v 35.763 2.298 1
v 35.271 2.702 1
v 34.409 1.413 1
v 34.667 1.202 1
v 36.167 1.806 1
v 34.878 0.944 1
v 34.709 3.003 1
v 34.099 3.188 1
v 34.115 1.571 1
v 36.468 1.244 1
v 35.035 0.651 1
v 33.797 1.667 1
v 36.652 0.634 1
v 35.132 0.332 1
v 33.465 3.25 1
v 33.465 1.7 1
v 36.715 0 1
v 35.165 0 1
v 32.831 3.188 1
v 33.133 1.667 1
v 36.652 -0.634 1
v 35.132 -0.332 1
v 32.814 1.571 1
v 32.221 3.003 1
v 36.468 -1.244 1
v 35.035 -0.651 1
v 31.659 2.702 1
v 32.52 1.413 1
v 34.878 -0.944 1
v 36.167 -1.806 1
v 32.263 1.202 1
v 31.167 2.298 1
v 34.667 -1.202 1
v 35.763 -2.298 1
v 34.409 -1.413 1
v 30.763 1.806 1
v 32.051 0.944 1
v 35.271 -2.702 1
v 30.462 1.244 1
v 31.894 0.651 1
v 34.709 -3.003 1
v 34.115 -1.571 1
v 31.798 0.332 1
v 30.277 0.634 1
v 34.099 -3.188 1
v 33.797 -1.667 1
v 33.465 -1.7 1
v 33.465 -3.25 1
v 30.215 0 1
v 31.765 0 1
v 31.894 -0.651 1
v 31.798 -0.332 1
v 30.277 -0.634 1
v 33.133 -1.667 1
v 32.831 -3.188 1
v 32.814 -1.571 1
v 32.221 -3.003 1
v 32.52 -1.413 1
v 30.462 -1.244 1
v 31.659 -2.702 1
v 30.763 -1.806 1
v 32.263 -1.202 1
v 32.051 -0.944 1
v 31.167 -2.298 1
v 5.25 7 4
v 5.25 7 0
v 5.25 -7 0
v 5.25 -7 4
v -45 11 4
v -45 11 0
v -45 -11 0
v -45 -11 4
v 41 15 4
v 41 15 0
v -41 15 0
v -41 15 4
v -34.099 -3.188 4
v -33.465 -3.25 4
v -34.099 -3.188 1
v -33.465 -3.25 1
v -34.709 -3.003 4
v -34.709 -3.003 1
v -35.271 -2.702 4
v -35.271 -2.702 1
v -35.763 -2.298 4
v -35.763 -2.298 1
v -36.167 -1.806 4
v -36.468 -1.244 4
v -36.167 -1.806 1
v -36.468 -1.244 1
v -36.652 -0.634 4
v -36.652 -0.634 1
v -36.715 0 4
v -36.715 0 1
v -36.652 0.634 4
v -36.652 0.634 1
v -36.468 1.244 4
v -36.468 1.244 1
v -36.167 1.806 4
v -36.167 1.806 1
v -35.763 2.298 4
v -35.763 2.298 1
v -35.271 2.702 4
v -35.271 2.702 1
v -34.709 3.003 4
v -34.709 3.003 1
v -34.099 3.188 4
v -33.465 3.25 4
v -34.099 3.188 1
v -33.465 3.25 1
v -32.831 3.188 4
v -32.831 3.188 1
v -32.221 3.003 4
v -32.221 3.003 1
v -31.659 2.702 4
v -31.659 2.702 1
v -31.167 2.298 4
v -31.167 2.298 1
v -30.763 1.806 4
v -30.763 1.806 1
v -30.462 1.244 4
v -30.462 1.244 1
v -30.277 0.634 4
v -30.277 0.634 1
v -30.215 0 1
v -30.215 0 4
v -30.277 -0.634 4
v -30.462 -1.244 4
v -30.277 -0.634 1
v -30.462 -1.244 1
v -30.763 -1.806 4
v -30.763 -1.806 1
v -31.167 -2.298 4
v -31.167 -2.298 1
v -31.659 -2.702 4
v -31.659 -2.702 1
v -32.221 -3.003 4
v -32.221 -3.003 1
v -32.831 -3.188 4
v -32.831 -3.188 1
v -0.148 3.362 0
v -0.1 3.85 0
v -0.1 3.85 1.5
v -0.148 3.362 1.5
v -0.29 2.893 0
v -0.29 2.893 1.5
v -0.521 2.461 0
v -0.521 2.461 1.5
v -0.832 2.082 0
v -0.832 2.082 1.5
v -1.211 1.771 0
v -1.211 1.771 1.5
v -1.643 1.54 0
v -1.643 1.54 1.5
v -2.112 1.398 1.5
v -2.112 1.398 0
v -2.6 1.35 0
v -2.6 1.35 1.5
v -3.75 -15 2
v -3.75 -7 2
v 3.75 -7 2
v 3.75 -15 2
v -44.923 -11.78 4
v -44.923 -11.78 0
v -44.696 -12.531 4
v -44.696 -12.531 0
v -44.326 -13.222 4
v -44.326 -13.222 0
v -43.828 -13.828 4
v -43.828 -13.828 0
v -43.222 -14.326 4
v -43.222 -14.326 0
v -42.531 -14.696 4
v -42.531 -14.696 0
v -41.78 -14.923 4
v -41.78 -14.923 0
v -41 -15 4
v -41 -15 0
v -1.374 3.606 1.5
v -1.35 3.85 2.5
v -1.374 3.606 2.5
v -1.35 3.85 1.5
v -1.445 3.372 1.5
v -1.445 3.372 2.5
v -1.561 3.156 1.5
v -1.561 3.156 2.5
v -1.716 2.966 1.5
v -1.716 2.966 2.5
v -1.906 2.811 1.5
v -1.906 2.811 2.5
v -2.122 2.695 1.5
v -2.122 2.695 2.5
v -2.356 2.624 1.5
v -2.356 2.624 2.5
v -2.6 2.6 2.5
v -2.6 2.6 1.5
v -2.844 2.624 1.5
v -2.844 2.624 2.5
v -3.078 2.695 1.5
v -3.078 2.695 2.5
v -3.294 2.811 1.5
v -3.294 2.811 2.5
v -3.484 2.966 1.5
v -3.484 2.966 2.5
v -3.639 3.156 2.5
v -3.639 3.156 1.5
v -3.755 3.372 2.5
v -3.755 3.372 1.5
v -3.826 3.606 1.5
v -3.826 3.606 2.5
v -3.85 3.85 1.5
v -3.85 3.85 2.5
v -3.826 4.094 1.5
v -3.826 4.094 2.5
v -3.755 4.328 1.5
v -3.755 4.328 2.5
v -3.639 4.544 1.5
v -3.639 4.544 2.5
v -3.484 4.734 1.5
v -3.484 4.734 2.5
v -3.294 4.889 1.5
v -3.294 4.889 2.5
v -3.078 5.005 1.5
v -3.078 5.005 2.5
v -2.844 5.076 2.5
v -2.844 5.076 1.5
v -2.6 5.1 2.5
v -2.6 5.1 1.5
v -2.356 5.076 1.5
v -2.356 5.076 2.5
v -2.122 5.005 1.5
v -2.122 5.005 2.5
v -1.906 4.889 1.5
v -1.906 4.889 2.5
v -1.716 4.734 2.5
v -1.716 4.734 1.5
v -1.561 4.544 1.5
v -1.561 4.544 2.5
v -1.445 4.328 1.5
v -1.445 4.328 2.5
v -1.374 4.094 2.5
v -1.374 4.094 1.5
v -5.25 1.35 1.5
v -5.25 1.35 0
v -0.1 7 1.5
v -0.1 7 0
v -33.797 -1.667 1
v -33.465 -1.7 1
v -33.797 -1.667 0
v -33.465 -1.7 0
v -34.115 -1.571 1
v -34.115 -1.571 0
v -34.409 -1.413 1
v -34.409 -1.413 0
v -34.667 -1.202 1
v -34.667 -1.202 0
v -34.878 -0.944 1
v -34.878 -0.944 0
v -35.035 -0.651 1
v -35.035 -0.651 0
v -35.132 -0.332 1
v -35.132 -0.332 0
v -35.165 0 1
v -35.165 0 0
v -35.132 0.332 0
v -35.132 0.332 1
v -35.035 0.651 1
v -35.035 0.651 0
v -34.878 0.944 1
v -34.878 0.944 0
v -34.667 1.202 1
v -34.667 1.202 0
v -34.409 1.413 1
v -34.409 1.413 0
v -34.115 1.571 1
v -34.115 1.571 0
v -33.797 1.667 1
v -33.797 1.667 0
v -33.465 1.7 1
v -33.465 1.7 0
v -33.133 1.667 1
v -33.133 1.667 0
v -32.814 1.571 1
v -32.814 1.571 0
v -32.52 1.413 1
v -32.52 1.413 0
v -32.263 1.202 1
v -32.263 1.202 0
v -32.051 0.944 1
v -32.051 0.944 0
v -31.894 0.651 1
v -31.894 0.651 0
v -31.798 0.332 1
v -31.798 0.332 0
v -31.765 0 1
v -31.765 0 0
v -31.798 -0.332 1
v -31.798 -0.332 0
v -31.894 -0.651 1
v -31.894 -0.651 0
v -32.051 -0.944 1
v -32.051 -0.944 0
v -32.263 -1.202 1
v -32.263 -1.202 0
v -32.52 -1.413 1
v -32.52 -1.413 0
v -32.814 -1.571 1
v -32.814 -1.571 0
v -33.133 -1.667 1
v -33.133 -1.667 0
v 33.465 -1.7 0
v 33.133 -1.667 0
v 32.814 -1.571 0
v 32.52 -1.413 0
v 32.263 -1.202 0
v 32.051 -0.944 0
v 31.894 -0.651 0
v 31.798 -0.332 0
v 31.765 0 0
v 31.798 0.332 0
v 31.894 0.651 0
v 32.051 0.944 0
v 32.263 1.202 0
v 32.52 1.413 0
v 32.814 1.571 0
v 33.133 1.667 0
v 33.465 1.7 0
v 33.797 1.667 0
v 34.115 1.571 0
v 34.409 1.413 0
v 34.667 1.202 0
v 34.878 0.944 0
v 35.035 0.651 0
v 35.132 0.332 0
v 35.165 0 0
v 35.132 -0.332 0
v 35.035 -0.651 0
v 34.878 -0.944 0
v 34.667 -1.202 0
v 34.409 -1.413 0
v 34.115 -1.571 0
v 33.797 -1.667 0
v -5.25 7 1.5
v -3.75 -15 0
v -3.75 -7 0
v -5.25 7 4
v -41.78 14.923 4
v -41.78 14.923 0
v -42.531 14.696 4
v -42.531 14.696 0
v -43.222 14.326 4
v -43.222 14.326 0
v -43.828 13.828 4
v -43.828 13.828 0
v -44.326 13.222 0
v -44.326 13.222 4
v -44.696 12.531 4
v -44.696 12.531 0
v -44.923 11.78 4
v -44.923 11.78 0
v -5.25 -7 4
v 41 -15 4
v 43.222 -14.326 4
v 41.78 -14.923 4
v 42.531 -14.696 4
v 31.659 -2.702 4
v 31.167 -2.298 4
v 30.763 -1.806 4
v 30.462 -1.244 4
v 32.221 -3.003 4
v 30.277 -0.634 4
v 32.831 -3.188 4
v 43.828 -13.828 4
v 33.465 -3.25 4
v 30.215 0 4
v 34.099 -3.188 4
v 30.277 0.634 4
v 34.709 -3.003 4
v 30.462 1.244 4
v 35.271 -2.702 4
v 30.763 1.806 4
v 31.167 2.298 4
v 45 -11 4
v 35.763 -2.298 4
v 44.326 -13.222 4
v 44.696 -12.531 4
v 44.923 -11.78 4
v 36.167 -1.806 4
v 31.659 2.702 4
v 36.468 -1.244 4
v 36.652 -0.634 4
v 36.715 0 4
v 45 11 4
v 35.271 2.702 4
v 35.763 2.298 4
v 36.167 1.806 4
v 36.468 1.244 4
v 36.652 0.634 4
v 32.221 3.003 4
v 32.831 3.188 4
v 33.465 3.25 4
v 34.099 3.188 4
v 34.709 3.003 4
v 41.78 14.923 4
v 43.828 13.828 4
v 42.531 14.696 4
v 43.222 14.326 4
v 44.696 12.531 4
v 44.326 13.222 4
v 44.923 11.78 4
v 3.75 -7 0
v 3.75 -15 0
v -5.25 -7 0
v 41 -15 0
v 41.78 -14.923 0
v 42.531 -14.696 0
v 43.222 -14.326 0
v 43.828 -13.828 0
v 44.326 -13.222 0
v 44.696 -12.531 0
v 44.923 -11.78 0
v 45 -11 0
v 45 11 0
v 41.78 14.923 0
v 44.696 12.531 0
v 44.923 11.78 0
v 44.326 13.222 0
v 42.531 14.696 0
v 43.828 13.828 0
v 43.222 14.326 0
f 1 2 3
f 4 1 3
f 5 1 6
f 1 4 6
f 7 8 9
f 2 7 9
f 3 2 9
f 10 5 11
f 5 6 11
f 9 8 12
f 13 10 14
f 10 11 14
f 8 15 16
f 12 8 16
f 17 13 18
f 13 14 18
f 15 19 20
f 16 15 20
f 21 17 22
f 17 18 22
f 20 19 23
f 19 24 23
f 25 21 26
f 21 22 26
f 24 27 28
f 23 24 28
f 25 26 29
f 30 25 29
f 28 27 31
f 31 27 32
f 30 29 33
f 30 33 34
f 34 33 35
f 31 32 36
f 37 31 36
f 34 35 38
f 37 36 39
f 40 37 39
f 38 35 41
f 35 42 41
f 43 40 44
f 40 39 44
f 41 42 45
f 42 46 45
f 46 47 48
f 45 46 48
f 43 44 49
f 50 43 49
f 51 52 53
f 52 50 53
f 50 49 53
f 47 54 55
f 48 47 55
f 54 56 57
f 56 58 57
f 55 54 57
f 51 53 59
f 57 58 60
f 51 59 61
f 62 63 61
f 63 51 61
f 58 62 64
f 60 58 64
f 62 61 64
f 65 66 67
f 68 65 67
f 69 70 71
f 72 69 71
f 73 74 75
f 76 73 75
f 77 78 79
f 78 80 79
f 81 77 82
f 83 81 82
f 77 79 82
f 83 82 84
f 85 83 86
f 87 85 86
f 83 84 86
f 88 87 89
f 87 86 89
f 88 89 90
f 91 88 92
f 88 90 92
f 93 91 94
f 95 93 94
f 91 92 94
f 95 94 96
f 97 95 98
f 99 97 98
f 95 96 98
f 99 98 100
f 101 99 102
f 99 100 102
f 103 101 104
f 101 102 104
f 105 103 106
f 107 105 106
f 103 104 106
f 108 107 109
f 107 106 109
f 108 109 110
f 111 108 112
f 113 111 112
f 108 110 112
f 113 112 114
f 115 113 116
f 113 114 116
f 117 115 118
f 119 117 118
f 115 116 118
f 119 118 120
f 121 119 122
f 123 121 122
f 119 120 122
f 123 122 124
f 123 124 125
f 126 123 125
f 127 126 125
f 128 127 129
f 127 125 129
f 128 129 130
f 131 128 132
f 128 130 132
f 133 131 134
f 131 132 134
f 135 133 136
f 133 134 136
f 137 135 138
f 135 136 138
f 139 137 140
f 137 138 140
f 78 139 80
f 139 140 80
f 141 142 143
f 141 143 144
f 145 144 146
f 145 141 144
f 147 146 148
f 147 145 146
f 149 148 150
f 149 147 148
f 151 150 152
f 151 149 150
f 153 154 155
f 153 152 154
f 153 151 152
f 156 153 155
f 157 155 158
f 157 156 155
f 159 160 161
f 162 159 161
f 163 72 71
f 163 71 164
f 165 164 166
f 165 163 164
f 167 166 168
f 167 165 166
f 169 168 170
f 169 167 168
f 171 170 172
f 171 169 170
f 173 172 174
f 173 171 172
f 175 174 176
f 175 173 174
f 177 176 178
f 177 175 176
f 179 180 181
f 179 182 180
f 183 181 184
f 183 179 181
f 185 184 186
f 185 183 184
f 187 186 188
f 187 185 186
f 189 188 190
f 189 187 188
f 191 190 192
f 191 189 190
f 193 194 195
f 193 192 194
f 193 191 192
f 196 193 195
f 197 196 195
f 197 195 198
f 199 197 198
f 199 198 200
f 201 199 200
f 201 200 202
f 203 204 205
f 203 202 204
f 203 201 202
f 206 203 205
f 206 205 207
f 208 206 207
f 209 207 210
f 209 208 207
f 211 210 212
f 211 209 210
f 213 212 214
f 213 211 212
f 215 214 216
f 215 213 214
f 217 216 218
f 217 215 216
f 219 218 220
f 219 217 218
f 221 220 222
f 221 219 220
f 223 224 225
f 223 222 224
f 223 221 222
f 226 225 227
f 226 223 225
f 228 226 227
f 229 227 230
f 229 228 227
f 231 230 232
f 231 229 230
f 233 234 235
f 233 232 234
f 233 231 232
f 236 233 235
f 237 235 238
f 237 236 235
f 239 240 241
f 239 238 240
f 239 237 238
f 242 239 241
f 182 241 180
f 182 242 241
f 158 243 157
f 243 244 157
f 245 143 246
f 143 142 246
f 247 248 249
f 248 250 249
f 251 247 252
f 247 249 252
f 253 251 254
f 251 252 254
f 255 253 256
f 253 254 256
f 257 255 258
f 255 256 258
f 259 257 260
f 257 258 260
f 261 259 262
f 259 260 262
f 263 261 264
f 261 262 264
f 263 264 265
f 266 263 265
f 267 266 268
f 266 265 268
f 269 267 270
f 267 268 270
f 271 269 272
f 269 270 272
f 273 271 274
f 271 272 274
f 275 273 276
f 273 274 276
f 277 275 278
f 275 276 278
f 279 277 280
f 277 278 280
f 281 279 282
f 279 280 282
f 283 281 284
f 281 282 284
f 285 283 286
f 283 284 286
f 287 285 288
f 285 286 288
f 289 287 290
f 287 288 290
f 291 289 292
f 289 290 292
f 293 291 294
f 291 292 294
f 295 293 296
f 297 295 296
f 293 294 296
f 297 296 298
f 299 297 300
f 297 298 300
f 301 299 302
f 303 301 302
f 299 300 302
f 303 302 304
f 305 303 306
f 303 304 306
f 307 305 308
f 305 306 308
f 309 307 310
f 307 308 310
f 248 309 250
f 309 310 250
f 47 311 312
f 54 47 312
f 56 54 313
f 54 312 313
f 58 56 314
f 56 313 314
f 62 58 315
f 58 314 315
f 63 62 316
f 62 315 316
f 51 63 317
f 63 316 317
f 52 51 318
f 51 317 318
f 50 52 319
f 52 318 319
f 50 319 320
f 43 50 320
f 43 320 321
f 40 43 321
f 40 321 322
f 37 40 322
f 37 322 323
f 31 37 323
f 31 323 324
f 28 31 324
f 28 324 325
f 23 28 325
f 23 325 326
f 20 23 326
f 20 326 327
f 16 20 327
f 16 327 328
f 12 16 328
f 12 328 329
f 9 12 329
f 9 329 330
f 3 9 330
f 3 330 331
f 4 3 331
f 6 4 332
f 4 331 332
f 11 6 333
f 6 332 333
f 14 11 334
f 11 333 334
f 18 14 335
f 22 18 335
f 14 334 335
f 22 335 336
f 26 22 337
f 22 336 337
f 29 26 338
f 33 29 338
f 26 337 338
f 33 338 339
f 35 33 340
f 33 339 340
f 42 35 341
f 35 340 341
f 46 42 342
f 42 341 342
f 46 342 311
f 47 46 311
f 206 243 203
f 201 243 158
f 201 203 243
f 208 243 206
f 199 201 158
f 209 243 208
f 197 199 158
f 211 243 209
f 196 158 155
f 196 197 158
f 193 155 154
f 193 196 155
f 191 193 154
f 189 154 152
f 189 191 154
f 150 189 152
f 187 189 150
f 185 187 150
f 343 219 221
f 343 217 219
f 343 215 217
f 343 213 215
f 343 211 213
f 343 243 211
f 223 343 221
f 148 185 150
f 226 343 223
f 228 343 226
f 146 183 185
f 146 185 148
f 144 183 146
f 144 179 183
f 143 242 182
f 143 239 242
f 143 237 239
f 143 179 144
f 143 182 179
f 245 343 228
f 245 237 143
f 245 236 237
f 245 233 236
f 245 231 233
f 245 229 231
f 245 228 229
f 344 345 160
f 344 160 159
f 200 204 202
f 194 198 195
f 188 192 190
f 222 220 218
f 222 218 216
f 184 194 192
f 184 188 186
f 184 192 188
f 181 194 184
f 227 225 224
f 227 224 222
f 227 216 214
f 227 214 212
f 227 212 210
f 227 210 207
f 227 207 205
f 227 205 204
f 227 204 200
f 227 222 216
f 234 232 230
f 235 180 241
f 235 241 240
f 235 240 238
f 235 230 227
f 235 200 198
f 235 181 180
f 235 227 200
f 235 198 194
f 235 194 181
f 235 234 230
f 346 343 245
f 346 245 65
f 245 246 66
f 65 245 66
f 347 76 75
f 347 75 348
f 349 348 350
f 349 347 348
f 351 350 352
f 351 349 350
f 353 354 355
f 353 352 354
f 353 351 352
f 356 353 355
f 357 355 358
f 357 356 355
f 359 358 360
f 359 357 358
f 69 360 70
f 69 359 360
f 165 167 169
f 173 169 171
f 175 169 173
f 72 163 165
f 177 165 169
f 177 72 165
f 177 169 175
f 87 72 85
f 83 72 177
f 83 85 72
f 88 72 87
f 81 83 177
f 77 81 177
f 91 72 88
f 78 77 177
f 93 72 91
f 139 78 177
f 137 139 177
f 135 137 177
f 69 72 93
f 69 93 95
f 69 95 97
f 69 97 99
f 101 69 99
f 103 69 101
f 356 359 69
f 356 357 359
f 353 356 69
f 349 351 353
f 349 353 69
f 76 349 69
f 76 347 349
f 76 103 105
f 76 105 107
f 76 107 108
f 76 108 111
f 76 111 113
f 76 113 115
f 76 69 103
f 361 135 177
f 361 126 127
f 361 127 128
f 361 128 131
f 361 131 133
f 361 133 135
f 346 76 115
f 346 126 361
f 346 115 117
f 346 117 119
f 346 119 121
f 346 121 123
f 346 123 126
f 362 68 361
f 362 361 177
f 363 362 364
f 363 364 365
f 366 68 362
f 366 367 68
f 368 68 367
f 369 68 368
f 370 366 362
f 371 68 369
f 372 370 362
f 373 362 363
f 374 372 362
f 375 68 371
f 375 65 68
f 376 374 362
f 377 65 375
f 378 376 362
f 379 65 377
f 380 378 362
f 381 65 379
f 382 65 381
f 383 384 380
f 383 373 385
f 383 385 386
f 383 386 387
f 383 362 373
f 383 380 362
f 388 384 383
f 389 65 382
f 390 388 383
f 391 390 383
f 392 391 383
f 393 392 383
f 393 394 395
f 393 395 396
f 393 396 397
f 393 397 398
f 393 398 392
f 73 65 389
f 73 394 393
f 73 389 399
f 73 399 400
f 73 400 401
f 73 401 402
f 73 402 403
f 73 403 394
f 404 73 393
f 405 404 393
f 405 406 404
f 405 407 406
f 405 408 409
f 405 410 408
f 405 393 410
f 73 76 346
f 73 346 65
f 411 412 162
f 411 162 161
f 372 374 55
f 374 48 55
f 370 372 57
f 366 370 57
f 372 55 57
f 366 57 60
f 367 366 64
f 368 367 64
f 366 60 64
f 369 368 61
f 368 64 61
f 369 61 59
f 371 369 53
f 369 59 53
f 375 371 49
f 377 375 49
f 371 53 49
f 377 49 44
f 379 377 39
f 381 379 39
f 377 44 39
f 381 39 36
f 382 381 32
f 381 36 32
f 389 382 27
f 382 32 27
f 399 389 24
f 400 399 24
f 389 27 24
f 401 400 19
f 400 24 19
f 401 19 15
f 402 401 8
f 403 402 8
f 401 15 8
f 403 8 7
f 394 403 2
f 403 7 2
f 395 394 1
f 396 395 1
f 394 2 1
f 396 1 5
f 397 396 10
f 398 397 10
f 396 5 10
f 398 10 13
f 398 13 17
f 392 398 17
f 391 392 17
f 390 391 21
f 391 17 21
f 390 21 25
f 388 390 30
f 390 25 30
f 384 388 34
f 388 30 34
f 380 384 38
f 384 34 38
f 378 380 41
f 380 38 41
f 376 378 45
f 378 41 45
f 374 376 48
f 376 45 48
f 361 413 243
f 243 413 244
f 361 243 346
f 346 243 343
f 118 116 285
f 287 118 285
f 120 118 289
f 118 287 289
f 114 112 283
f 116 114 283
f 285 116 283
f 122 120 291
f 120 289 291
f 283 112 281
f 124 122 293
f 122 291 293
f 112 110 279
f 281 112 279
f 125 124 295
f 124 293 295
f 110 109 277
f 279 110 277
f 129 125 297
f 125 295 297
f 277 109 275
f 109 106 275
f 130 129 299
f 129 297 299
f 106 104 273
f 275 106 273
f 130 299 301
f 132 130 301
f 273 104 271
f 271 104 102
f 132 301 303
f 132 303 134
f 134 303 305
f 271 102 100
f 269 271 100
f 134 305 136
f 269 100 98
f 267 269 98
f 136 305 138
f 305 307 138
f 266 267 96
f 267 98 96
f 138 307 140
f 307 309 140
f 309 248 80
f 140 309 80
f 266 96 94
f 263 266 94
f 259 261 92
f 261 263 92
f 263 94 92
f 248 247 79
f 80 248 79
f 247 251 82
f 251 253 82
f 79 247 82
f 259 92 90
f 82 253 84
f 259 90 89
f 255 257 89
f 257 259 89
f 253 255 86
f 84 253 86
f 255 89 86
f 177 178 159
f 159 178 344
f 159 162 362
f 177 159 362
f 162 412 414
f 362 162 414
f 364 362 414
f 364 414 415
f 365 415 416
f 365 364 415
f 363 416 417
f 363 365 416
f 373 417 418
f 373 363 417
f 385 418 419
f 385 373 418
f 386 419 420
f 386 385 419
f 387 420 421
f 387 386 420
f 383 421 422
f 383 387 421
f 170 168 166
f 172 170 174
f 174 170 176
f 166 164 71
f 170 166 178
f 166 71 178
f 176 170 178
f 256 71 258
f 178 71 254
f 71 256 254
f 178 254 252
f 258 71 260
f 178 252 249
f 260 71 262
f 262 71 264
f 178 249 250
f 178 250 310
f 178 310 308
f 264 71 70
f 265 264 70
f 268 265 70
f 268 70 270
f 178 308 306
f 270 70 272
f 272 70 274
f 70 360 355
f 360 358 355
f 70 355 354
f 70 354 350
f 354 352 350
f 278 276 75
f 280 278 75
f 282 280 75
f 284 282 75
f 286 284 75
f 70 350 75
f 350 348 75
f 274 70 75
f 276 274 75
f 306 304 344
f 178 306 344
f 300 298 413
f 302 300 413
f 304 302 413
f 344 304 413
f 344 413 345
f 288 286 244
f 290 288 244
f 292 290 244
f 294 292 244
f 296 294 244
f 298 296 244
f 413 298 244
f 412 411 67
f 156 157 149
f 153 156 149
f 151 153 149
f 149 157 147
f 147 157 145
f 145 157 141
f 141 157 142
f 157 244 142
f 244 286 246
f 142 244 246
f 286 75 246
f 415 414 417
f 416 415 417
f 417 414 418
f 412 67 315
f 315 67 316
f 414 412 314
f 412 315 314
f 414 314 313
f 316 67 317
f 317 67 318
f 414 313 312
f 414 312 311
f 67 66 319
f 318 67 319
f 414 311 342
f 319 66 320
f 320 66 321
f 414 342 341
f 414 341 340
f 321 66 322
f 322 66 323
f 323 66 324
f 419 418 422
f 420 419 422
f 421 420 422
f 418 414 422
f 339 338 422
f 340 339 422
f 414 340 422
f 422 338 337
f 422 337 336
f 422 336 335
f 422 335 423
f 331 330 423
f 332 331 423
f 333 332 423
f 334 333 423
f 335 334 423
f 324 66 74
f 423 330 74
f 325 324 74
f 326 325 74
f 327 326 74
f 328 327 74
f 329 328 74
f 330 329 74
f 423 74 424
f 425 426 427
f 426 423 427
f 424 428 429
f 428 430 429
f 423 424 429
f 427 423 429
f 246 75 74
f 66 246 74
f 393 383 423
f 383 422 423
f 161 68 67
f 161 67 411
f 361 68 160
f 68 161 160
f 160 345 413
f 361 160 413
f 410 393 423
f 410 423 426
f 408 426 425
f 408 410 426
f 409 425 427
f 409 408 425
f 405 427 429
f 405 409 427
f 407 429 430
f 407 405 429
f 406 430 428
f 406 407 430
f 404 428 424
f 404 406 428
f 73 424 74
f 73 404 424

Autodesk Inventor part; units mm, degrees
ref_plane "YZ Plane" through (0, 0, 0) normal (1, 0, 0) x (0, 1, 0)
ref_plane "XZ Plane" through (0, 0, 0) normal (0, 1, 0) x (-1, 0, 0)
ref_plane "XY Plane" through (0, 0, 0) normal (0, 0, 1) x (1, 0, 0)
sketch "Skizze1" plane through (0, 0, 0) normal (0, 0, 1) x (1, 0, 0)
  line L0 (-45, -15) -> (45, -15)
  line L1 (45, -15) -> (45, 15)
  line L2 (45, 15) -> (-45, 15)
  line L3 (-45, 15) -> (-45, -15)
  line L4 (-45, -15) -> (45, 15) construction
  line L5 (45, -15) -> (-45, 15) construction
  circle A0 centre (-33.4649, 0) radius 1.5
  circle A1 centre (33.4649, 0) radius 1.5
  line L6 (0, -21) -> (0, 21) construction
  line L7 (-63, 0) -> (63, 0) construction
  line L8 (-5.25, 7) -> (5.25, 7)
  line L9 (5.25, 7) -> (5.25, -7)
  line L10 (5.25, -7) -> (-5.25, -7)
  line L11 (-5.25, -7) -> (-5.25, 7)
  circle A2 centre (-2.6, 3.85) radius 1.65 construction
  circle A3 centre (-2.6, 3.85) radius 1.25
  circle A4 centre (-2.6, 3.85) radius 2.5
  line L12 (-5.25, 1.35) -> (-2.6, 1.35)
  line L13 (-0.1, 3.85) -> (-0.1, 7)
  line L14 (-5.25, 1.35) -> (-5.25, 7)
  line L15 (-5.25, 7) -> (-0.1, 7)
  line L16 (-3.75, -15) -> (3.75, -15)
  line L17 (3.75, -15) -> (3.75, -7)
  line L18 (3.75, -7) -> (-3.75, -7)
  line L19 (-3.75, -7) -> (-3.75, -15)
  point P0 (0, 0)
  point P1 (0, -7)
  point P2 (-5.25, -15)
  point P3 (-5.25, -4.15)
  point P4 (5.25, 0)
  point P5 (0, -15)
  dimension "d0" = 66.9299
  dimension "d1" = 30
  dimension "d2" = 90
  dimension "d3" = 3
  dimension "d6" = 14
  dimension "d7" = 10.5
  dimension "d8" = 1
  dimension "d9" = 1.5
  dimension "d10" = 3.3
  dimension "d11" = 2.5
  dimension "d16" = 5
  dimension "d18" = 7.5
extrude "Extrusion2" add sketch "Skizze1" along normal blind 4 contours L3 L2 L1 L0 L17 L10 L9 L8 L11 L19 | L19 L10 L17 L0
extrude "Extrusion3" add sketch "Skizze1" along normal blind 1.5 contours L11 L8 L13 A4 L12 | A4
extrude "Extrusion6" cut sketch "Skizze1" along normal blind 2 contours L19 L10 L17 L0
fillet "Rundung1" radius 4 4 edges at (-45, -15, 2) (-45, 15, 2) (45, 15, 2) (45, -15, 2)
sketch "Skizze2" plane through (0, 0, 4) normal (0, 0, 1) x (1, 0, 0)
  circle A0 centre (-33.4649, 0) radius 1.5 projected
  circle A1 centre (33.4649, 0) radius 1.5 projected
  point P0 (0, 0)
  point P1 (32.8585, 1.3744)
hole "Bohrung1" at (-33.4649, 0, 4) at (33.4649, 0, 4) direction (0, 0, -1) diameter 3.4 end through all counterbore diameter 6.5 counterbore depth 3 clearance for "Inbusschraube DIN EN ISO 4762" size "M3" standard "DIN"
extrude "Extrusion7" add sketch "Skizze1" along normal blind 2.5 contours A3
properties part number "BMP280_Holder"
